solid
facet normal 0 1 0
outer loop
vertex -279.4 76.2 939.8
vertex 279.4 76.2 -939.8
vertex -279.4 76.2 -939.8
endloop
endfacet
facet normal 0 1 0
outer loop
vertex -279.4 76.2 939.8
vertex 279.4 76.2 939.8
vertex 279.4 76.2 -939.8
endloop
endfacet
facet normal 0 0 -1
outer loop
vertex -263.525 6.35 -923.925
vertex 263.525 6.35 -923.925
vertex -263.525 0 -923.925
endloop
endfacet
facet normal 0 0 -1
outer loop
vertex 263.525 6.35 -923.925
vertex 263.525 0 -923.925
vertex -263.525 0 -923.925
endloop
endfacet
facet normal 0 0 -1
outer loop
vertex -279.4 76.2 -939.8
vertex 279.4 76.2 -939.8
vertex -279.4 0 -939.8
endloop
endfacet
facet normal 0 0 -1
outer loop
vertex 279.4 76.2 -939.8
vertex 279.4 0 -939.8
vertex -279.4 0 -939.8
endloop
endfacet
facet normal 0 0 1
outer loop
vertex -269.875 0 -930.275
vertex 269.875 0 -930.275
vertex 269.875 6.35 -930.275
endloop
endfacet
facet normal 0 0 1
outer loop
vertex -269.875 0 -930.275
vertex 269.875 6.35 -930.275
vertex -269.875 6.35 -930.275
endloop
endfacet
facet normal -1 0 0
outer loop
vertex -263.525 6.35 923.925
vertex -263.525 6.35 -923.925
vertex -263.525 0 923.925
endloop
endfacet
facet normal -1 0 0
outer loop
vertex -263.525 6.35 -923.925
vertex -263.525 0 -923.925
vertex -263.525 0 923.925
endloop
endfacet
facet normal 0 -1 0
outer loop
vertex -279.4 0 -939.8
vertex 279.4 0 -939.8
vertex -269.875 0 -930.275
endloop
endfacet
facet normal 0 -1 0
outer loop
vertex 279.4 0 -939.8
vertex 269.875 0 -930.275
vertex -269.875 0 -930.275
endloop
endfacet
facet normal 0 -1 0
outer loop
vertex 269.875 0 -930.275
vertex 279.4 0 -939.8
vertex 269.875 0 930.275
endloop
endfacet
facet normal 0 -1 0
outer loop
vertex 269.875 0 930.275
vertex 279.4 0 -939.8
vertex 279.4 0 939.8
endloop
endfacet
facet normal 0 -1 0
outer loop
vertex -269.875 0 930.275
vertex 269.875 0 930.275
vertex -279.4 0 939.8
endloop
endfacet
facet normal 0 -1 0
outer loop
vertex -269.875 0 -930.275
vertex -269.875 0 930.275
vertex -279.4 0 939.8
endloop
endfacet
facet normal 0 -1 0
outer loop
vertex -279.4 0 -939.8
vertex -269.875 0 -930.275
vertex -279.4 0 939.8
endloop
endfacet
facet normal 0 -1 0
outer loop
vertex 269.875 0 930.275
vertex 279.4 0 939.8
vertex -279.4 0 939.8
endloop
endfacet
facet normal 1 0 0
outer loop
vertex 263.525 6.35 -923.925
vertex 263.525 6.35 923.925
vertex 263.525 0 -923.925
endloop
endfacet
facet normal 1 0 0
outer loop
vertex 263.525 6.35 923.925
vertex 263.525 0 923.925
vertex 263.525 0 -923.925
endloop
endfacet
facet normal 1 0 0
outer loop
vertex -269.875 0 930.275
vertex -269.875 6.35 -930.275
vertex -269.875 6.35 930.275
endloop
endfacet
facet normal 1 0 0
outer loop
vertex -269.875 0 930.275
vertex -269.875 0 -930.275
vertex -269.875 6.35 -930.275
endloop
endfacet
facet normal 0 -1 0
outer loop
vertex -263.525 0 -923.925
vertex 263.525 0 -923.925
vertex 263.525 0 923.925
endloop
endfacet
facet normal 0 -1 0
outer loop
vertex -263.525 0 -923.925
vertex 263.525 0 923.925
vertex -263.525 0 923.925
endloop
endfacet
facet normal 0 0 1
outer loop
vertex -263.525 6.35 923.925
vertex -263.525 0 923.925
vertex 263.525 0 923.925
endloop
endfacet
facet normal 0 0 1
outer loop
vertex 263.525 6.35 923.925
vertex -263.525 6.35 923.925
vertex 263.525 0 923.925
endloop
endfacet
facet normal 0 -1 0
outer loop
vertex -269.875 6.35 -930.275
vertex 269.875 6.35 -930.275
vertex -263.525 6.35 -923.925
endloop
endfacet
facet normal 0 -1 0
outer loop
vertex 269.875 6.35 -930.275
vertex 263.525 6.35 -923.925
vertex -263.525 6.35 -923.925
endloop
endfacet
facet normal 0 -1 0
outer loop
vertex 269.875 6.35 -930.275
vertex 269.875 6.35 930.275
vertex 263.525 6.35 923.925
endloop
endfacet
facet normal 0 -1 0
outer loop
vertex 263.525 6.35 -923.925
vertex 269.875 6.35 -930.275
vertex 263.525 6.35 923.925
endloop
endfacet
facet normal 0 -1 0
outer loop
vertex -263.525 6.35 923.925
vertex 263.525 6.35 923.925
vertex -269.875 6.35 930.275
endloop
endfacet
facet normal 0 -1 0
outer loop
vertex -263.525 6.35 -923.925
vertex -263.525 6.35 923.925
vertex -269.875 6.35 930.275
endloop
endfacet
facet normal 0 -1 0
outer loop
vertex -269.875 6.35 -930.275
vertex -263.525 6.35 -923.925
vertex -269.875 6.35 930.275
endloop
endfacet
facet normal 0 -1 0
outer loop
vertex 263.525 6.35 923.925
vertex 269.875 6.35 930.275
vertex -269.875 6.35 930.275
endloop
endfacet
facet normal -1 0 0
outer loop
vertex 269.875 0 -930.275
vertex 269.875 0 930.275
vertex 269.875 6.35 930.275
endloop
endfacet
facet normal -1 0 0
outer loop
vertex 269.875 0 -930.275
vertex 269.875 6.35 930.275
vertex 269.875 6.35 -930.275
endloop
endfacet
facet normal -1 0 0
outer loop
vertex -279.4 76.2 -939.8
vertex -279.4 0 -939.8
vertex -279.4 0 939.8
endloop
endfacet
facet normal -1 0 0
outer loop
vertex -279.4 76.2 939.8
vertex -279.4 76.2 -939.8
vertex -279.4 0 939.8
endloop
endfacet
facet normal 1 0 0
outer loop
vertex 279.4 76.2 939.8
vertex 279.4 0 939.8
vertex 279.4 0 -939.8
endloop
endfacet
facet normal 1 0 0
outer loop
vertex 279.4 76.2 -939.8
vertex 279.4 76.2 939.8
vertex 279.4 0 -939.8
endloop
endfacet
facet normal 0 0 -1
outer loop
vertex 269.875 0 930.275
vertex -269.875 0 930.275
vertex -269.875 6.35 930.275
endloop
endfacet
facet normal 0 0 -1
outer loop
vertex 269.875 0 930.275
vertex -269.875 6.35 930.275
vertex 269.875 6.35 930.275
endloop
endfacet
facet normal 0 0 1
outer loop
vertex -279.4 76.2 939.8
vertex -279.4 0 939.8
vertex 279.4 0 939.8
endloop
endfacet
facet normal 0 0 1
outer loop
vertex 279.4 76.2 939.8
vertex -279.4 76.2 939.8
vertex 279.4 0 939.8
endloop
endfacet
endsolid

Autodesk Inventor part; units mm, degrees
ref_plane "YZ Plane" through (0, 0, 0) normal (1, 0, 0) x (0, 1, 0)
ref_plane "XZ Plane" through (0, 0, 0) normal (0, 1, 0) x (-1, 0, 0)
ref_plane "XY Plane" through (0, 0, 0) normal (0, 0, 1) x (1, 0, 0)
sketch "Sketch1" plane through (0, 0, 0) normal (0, 1, 0) x (-1, 0, 0)
  line L0 (279.4, 939.8) -> (-279.4, 939.8)
  line L1 (-279.4, 939.8) -> (-279.4, -939.8)
  line L2 (-279.4, -939.8) -> (279.4, -939.8)
  line L3 (279.4, -939.8) -> (279.4, 939.8)
  line L4 (279.4, 939.8) -> (-279.4, -939.8) construction
  line L5 (-279.4, 939.8) -> (279.4, -939.8) construction
  line L6 (269.875, 930.275) -> (-269.875, 930.275)
  line L7 (-269.875, 930.275) -> (-269.875, -930.275)
  line L8 (-269.875, -930.275) -> (269.875, -930.275)
  line L9 (269.875, -930.275) -> (269.875, 930.275)
  line L10 (263.525, 923.925) -> (-263.525, 923.925)
  line L11 (-263.525, 923.925) -> (-263.525, -923.925)
  line L12 (-263.525, -923.925) -> (263.525, -923.925)
  line L13 (263.525, -923.925) -> (263.525, 923.925)
  point P0 (0, 0)
  dimension "d2" = 558.8
  dimension "d3" = 1879.6
  dimension "d4" = 9.525
  dimension "d5" = 6.35
extrude "Extrusion1" add sketch "Sketch1" along normal blind 76.2 contours L3 L2 L1 L0 | L9 L8 L7 L6 | L13 L12 L11 L10
extrude "Extrusion3" cut sketch "Sketch1" along normal blind 6.35 contours L9 L8 L7 L6
properties part number "B - Cap - 1" material "Granite, Cut, Polished"
